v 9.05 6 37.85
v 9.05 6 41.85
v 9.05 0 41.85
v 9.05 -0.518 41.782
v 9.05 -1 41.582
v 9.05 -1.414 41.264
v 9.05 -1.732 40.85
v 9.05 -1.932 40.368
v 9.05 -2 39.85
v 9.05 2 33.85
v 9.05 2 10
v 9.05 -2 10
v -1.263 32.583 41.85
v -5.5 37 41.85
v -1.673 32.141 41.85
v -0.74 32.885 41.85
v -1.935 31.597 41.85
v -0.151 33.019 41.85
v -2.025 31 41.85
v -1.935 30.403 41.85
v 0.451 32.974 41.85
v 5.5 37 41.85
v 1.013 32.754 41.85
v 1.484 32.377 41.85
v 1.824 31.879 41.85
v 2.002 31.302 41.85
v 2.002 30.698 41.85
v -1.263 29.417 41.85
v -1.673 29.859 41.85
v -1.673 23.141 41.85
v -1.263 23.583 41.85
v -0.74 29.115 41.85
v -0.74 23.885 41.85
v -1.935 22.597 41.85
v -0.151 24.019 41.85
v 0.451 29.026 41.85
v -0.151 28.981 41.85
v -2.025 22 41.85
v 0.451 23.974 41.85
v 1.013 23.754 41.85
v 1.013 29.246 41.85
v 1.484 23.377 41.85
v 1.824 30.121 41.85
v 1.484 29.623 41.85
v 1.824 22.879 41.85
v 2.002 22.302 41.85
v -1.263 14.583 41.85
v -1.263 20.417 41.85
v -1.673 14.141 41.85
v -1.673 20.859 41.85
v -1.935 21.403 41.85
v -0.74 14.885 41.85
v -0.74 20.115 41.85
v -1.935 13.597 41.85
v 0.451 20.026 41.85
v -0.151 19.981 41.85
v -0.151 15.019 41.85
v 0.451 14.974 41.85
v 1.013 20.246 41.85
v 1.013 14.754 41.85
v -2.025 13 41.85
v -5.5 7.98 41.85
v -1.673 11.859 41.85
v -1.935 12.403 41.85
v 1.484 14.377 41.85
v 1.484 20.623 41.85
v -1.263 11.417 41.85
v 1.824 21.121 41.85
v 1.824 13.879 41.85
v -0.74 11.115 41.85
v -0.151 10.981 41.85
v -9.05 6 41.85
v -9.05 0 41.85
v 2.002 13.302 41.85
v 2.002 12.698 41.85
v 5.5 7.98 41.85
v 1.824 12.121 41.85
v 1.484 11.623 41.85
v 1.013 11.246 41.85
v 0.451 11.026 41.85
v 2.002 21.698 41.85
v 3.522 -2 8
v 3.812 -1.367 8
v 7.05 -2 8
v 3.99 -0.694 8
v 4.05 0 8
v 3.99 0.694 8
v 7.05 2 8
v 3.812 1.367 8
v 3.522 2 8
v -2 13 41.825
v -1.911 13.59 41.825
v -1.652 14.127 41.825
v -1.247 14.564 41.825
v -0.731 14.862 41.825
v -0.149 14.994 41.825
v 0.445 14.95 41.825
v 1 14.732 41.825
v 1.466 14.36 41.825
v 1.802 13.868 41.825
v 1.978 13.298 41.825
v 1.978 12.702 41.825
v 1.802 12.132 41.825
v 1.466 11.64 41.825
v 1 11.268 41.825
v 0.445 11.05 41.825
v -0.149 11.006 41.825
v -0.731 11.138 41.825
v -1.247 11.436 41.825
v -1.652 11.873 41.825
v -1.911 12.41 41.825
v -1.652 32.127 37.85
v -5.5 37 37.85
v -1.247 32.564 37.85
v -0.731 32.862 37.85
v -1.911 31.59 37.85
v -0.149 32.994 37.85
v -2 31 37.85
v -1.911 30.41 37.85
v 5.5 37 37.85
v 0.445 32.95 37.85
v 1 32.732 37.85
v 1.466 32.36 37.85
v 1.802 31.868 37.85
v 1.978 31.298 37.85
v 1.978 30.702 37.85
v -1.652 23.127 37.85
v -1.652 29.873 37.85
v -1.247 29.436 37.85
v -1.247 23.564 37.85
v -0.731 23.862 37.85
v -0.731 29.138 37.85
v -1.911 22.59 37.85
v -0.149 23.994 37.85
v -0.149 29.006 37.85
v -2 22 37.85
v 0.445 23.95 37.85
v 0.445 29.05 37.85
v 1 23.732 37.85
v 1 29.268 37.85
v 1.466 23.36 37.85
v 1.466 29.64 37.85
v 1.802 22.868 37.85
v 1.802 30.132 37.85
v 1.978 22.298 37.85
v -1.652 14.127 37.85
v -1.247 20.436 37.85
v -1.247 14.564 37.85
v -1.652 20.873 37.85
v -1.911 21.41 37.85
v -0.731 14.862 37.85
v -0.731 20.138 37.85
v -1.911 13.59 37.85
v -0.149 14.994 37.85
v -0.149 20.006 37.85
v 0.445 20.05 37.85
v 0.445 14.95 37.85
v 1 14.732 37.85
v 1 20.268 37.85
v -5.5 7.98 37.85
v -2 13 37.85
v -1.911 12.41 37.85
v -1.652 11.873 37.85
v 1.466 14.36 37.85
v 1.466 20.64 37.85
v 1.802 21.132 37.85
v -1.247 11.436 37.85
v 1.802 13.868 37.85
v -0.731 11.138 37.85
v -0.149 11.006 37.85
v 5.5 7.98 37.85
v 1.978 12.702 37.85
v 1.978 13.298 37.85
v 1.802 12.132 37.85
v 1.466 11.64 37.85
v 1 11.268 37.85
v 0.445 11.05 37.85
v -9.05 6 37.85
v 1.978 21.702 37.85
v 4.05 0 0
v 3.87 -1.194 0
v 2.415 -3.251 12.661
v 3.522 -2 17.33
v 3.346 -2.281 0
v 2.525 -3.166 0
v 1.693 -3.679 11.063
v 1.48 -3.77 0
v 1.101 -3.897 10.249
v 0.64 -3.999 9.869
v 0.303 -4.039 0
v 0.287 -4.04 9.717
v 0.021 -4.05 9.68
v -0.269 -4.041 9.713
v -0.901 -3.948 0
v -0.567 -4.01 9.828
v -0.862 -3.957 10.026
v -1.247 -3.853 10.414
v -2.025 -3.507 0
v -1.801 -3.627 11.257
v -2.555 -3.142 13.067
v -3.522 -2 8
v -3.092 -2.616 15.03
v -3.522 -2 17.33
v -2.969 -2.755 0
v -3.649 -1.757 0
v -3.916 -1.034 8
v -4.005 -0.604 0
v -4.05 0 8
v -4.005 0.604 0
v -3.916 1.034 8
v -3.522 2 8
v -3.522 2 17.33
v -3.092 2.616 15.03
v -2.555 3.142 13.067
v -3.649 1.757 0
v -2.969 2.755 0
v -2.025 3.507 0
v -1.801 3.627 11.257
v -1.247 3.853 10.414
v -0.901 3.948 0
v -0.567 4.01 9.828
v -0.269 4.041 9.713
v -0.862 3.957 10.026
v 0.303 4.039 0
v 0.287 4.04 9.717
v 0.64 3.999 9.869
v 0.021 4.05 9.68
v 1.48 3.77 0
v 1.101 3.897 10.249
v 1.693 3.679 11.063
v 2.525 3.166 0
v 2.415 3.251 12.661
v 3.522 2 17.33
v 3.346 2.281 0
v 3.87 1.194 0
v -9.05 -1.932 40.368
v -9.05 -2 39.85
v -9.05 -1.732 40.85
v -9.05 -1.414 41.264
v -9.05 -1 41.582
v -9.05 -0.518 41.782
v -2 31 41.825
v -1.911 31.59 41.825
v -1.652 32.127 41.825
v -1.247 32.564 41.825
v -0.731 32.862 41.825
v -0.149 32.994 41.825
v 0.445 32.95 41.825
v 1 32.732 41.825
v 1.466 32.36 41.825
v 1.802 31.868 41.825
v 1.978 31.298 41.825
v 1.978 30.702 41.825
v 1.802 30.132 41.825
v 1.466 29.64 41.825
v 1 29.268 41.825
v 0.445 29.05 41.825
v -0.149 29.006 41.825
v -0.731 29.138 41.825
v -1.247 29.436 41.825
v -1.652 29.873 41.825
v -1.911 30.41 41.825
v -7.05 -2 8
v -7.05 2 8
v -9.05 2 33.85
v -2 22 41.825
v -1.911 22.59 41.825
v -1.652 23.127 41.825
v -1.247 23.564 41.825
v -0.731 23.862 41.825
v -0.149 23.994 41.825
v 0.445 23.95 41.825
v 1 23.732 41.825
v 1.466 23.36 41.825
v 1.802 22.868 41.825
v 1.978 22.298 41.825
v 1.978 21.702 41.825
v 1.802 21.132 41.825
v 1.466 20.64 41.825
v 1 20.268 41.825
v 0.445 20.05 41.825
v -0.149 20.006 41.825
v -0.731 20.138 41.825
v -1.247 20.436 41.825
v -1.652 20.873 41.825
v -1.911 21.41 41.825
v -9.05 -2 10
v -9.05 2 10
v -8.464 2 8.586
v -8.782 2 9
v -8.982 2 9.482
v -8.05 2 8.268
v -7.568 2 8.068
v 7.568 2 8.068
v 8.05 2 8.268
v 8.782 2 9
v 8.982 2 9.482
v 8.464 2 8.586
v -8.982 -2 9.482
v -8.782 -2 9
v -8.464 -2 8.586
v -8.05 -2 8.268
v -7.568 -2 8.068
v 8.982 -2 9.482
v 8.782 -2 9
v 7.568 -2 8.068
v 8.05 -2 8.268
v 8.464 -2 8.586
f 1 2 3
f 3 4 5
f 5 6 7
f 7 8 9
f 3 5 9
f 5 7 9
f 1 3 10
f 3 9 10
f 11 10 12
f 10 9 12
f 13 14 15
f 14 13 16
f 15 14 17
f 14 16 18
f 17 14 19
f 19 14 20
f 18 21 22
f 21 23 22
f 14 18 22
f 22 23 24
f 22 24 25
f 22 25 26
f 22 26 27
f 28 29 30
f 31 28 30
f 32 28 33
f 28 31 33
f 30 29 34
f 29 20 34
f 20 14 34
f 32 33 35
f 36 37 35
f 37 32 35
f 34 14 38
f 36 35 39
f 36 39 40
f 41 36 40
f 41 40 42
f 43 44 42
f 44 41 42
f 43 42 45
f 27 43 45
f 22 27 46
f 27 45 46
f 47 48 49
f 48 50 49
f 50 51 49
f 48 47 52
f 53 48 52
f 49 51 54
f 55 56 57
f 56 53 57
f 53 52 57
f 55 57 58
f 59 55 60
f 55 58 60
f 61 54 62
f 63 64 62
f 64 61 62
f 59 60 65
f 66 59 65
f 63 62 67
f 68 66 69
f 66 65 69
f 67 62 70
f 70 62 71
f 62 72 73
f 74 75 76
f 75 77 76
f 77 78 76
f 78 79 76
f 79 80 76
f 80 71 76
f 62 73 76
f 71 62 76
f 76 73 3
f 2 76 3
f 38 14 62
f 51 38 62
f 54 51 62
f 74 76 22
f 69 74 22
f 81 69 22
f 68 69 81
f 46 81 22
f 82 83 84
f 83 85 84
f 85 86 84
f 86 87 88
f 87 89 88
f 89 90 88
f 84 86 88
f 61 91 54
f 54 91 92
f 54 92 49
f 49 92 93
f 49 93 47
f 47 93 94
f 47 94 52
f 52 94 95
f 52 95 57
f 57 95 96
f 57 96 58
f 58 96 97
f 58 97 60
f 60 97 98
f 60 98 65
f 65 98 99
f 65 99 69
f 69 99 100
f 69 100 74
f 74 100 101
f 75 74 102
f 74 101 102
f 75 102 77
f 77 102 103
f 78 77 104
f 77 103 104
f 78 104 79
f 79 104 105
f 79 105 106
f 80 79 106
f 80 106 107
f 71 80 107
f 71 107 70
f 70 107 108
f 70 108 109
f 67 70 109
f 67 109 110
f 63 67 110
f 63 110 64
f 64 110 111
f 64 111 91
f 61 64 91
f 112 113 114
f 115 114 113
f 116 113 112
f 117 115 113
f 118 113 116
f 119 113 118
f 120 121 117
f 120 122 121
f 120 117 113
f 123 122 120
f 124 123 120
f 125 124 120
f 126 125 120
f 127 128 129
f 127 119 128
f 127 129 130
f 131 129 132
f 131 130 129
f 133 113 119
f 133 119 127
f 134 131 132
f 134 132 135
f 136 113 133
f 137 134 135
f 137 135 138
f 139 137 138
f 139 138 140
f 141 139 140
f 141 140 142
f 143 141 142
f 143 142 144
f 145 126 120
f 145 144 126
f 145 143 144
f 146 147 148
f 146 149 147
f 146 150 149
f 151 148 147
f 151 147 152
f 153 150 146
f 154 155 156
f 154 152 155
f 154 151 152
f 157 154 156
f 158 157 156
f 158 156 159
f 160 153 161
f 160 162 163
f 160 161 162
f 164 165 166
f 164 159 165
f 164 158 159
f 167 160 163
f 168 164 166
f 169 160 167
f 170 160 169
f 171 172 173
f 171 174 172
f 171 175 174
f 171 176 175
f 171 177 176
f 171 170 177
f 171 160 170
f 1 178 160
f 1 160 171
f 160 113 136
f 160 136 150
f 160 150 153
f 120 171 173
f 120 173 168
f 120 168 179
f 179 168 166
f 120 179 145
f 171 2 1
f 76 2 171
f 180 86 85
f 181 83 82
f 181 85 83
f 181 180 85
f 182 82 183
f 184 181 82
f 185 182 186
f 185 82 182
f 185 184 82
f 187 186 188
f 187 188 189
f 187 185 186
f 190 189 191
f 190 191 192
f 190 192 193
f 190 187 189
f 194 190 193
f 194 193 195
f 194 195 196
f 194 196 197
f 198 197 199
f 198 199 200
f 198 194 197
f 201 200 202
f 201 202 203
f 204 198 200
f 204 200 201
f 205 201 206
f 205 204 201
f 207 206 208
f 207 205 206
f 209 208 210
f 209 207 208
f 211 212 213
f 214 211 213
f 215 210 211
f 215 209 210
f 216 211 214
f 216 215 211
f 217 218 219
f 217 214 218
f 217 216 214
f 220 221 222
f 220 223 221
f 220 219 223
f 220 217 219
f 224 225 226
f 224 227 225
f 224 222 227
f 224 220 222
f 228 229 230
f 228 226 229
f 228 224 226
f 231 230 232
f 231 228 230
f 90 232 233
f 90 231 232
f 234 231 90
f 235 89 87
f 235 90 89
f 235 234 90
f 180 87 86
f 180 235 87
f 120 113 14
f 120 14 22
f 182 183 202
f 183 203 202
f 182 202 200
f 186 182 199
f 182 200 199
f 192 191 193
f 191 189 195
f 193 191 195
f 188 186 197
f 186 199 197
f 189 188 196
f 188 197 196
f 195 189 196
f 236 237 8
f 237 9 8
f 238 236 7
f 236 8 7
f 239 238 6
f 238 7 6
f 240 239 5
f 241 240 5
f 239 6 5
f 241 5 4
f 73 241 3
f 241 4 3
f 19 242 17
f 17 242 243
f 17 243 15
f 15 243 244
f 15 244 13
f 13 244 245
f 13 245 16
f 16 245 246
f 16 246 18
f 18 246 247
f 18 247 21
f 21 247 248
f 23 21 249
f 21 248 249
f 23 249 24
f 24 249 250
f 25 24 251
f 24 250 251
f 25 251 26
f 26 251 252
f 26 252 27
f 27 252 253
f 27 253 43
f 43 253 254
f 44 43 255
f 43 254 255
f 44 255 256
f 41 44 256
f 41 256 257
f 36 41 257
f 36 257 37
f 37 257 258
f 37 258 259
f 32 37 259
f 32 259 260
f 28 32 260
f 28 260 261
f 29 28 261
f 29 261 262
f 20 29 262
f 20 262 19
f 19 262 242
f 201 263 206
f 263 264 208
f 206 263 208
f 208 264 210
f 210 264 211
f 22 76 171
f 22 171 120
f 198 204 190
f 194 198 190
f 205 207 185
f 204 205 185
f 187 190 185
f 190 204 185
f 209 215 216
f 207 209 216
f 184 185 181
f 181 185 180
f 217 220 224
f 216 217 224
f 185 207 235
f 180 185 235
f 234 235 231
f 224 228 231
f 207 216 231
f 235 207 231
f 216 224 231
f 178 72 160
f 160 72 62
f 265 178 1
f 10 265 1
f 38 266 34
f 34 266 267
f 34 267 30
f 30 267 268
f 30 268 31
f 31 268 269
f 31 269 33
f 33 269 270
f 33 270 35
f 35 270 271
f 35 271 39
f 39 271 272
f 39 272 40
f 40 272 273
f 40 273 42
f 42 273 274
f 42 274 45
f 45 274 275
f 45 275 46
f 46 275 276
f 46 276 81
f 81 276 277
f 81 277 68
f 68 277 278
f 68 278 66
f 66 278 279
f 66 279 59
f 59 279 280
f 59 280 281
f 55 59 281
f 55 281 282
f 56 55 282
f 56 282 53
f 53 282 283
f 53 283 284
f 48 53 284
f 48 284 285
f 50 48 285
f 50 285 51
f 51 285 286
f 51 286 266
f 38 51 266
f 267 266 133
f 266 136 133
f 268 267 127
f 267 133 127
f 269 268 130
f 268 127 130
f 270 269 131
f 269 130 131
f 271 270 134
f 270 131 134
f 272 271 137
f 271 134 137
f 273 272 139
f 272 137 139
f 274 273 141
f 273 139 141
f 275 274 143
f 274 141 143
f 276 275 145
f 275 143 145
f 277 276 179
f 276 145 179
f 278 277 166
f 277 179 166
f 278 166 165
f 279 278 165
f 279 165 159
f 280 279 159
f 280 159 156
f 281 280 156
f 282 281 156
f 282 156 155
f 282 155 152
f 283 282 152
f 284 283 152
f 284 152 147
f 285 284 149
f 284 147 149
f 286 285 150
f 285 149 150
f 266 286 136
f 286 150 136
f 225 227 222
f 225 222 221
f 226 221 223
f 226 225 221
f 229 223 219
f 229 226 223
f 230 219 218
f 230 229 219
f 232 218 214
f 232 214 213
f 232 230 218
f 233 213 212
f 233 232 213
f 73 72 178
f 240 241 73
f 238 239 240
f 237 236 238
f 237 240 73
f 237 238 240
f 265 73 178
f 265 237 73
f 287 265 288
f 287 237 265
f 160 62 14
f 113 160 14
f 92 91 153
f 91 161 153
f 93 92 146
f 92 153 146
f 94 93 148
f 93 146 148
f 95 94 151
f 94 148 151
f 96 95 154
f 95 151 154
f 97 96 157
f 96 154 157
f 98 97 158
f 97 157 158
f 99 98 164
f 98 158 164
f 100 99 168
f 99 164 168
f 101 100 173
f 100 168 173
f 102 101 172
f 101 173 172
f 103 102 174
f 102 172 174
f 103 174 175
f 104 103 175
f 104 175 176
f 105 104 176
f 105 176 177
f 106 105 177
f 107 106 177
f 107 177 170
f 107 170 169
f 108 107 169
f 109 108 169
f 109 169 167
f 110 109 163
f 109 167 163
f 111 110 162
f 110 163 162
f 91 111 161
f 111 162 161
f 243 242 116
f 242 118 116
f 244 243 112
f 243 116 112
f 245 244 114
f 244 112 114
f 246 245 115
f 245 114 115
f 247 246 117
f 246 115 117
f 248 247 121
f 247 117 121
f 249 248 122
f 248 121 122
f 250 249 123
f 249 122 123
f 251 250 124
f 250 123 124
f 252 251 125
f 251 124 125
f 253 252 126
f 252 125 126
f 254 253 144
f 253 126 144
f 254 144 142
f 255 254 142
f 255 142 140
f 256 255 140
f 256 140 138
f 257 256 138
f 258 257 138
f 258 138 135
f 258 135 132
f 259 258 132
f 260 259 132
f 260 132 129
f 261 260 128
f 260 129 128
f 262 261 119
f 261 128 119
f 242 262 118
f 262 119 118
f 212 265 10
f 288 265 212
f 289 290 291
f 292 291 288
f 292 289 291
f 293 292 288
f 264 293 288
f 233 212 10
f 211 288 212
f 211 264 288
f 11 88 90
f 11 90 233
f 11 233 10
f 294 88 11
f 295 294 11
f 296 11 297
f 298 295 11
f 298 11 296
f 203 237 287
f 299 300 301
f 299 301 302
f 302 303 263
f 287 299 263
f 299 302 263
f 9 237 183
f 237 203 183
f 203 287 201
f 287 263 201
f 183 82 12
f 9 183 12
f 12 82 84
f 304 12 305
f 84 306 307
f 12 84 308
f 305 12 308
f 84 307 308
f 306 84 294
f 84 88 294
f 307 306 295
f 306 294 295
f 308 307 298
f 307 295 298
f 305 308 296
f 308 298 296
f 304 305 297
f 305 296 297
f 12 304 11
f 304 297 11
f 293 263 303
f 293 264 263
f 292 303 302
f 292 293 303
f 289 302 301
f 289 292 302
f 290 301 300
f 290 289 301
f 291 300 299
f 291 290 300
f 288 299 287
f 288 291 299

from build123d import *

# Parameters (mm, degrees)
SKETCH1_R                       = 4.05
BOSS_EXTRUDE1_DEPTH             = 8
SKETCH2_W                       = 18.1
SKETCH2_H                       = 4
BOSS_EXTRUDE2_DEPTH             = 33.85
CHAMFER1_SIZE                   = 2.5
CHAMFER1_SIZE_2                 = 9.330127019
CHAMFER2_SIZE                   = 9.330127019
CHAMFER2_SIZE_2                 = 2.5
FILLET1_R                       = 2
SKETCH3_W                       = 18.1
SKETCH3_H                       = 4
BOSS_EXTRUDE3_DEPTH             = 35
CHAMFER3_SIZE                   = 4
F_4_0MM_DOWEL_HOLE1_D           = 4
F_4_0MM_DOWEL_HOLE1_CSINK_D     = 4.05
F_4_0MM_DOWEL_HOLE1_CSINK_ANGLE = 90
FILLET2_R                       = 2
CUT_EXTRUDE1_DEPTH              = 54.698463665
CUT_EXTRUDE1_DEPTH_BACK         = 54.698463665
CUT_EXTRUDE2_DEPTH              = 54.698463665
CUT_EXTRUDE2_DEPTH_BACK         = 54.698463665


with BuildPart() as part:
    # Sketch1 → Boss-Extrude1 (new body)
    with BuildSketch(Plane.XY):
        Circle(SKETCH1_R)
    extrude(amount=BOSS_EXTRUDE1_DEPTH)

    # Sketch2 → Boss-Extrude2 (add)
    with BuildSketch(Plane.XY.offset(8)):
        Rectangle(SKETCH2_W, SKETCH2_H)
    extrude(amount=BOSS_EXTRUDE2_DEPTH)

    # Chamfer1
    # the kernel refuses this chamfer: 9.330127019, 2.5 mm, written as the material it adds along each edge
    with BuildSketch(Plane(origin=(27.749460413, 2, 8), x_dir=(0, 0.9905000388259542, -0.1375124470212913), z_dir=(-1, 0, 0))) as chamfer1_piece_1_section:
        Polygon((CHAMFER1_SIZE * 0.990500038826, -CHAMFER1_SIZE * 0.137512447021), (-CHAMFER1_SIZE_2 * 0.13751244702, -CHAMFER1_SIZE_2 * 0.990500038818), (0, 0), align=None)
    chamfer1_piece_1 = extrude(amount=55.498920827, mode=Mode.PRIVATE)
    chamfer1_piece_1 = chamfer1_piece_1 & Plane(origin=(0, 0, 11.423628779), x_dir=(1, 0, 0), z_dir=(0, 0, -1)) * Cylinder(4.05, 148, mode=Mode.PRIVATE)
    add(chamfer1_piece_1)

    # Chamfer2
    # the kernel refuses this chamfer: 9.330127019, 2.5 mm, written as the material it adds along each edge
    with BuildSketch(Plane(origin=(-27.749460413, -2, 8), x_dir=(0, 0.009967146577156291, 0.9999503267608394), z_dir=(1, 0, 0))) as chamfer2_piece_1_section:
        Polygon((CHAMFER2_SIZE * 0.999950326753, CHAMFER2_SIZE * 0.00996714657707), (-CHAMFER2_SIZE_2 * 0.00996714657716, CHAMFER2_SIZE_2 * 0.999950326761), (0, 0), align=None)
    chamfer2_piece_1 = extrude(amount=55.498920827, mode=Mode.PRIVATE)
    chamfer2_piece_1 = chamfer2_piece_1 & Plane(origin=(0, 0, 11.423628779), x_dir=(1, 0, 0), z_dir=(0, 0, -1)) * Cylinder(4.05, 149, mode=Mode.PRIVATE)
    add(chamfer2_piece_1)

    # Fillet1
    fillet1_edges = [part.edges().sort_by_distance(p)[0] for p in [
        (9.05, 0, 8),
        (-9.05, 0, 8),
    ]]
    fillet(fillet1_edges, radius=FILLET1_R)

    # Sketch3 → Boss-Extrude3 (add)
    with BuildSketch(Plane(origin=(0, 2, 0), x_dir=(1, 0, 0), z_dir=(0, 1, 0))):
        with Locations((0, -39.85)):
            Rectangle(SKETCH3_W, SKETCH3_H)
    extrude(amount=BOSS_EXTRUDE3_DEPTH)

    # Chamfer3
    chamfer3_edges = [part.edges().sort_by_distance(p)[0] for p in [
        (0, 2, 37.85),
    ]]
    chamfer(chamfer3_edges, length=CHAMFER3_SIZE)

    # Ø4.0mm Dowel Hole1 (through all)
    with Locations(Plane.XY.offset(41.85)):
        with Locations((0, 31), (0, 22), (0, 13)):
            CounterSinkHole(F_4_0MM_DOWEL_HOLE1_D / 2, F_4_0MM_DOWEL_HOLE1_CSINK_D / 2, counter_sink_angle=F_4_0MM_DOWEL_HOLE1_CSINK_ANGLE)

    # Fillet2
    fillet2_edges = [part.edges().sort_by_distance(p)[0] for p in [
        (0, -2, 41.85),
    ]]
    fillet(fillet2_edges, radius=FILLET2_R)

    # Sketch6 → Cut-Extrude1 (cut, two sides: drawn at the far end of the back side and taken through both)
    with BuildSketch(Plane(origin=(0, 0, 37.85), x_dir=(-1, 0, 0), z_dir=(0, 0, -1)).offset(-CUT_EXTRUDE1_DEPTH_BACK)):
        Polygon((-9.05, 6), (-5.5, 7.98), (-5.5, 37), (-9.05, 37), align=None)
    extrude(amount=CUT_EXTRUDE1_DEPTH + CUT_EXTRUDE1_DEPTH_BACK, mode=Mode.SUBTRACT)

    # Sketch7 → Cut-Extrude2 (cut, two sides: drawn at the far end of the back side and taken through both)
    with BuildSketch(Plane(origin=(0, 0, 37.85), x_dir=(-1, 0, 0), z_dir=(0, 0, -1)).offset(-CUT_EXTRUDE2_DEPTH_BACK)):
        Polygon((9.05, 6), (5.5, 7.98), (5.5, 37), (9.05, 37), align=None)
    extrude(amount=CUT_EXTRUDE2_DEPTH + CUT_EXTRUDE2_DEPTH_BACK, mode=Mode.SUBTRACT)


solid = part.part
